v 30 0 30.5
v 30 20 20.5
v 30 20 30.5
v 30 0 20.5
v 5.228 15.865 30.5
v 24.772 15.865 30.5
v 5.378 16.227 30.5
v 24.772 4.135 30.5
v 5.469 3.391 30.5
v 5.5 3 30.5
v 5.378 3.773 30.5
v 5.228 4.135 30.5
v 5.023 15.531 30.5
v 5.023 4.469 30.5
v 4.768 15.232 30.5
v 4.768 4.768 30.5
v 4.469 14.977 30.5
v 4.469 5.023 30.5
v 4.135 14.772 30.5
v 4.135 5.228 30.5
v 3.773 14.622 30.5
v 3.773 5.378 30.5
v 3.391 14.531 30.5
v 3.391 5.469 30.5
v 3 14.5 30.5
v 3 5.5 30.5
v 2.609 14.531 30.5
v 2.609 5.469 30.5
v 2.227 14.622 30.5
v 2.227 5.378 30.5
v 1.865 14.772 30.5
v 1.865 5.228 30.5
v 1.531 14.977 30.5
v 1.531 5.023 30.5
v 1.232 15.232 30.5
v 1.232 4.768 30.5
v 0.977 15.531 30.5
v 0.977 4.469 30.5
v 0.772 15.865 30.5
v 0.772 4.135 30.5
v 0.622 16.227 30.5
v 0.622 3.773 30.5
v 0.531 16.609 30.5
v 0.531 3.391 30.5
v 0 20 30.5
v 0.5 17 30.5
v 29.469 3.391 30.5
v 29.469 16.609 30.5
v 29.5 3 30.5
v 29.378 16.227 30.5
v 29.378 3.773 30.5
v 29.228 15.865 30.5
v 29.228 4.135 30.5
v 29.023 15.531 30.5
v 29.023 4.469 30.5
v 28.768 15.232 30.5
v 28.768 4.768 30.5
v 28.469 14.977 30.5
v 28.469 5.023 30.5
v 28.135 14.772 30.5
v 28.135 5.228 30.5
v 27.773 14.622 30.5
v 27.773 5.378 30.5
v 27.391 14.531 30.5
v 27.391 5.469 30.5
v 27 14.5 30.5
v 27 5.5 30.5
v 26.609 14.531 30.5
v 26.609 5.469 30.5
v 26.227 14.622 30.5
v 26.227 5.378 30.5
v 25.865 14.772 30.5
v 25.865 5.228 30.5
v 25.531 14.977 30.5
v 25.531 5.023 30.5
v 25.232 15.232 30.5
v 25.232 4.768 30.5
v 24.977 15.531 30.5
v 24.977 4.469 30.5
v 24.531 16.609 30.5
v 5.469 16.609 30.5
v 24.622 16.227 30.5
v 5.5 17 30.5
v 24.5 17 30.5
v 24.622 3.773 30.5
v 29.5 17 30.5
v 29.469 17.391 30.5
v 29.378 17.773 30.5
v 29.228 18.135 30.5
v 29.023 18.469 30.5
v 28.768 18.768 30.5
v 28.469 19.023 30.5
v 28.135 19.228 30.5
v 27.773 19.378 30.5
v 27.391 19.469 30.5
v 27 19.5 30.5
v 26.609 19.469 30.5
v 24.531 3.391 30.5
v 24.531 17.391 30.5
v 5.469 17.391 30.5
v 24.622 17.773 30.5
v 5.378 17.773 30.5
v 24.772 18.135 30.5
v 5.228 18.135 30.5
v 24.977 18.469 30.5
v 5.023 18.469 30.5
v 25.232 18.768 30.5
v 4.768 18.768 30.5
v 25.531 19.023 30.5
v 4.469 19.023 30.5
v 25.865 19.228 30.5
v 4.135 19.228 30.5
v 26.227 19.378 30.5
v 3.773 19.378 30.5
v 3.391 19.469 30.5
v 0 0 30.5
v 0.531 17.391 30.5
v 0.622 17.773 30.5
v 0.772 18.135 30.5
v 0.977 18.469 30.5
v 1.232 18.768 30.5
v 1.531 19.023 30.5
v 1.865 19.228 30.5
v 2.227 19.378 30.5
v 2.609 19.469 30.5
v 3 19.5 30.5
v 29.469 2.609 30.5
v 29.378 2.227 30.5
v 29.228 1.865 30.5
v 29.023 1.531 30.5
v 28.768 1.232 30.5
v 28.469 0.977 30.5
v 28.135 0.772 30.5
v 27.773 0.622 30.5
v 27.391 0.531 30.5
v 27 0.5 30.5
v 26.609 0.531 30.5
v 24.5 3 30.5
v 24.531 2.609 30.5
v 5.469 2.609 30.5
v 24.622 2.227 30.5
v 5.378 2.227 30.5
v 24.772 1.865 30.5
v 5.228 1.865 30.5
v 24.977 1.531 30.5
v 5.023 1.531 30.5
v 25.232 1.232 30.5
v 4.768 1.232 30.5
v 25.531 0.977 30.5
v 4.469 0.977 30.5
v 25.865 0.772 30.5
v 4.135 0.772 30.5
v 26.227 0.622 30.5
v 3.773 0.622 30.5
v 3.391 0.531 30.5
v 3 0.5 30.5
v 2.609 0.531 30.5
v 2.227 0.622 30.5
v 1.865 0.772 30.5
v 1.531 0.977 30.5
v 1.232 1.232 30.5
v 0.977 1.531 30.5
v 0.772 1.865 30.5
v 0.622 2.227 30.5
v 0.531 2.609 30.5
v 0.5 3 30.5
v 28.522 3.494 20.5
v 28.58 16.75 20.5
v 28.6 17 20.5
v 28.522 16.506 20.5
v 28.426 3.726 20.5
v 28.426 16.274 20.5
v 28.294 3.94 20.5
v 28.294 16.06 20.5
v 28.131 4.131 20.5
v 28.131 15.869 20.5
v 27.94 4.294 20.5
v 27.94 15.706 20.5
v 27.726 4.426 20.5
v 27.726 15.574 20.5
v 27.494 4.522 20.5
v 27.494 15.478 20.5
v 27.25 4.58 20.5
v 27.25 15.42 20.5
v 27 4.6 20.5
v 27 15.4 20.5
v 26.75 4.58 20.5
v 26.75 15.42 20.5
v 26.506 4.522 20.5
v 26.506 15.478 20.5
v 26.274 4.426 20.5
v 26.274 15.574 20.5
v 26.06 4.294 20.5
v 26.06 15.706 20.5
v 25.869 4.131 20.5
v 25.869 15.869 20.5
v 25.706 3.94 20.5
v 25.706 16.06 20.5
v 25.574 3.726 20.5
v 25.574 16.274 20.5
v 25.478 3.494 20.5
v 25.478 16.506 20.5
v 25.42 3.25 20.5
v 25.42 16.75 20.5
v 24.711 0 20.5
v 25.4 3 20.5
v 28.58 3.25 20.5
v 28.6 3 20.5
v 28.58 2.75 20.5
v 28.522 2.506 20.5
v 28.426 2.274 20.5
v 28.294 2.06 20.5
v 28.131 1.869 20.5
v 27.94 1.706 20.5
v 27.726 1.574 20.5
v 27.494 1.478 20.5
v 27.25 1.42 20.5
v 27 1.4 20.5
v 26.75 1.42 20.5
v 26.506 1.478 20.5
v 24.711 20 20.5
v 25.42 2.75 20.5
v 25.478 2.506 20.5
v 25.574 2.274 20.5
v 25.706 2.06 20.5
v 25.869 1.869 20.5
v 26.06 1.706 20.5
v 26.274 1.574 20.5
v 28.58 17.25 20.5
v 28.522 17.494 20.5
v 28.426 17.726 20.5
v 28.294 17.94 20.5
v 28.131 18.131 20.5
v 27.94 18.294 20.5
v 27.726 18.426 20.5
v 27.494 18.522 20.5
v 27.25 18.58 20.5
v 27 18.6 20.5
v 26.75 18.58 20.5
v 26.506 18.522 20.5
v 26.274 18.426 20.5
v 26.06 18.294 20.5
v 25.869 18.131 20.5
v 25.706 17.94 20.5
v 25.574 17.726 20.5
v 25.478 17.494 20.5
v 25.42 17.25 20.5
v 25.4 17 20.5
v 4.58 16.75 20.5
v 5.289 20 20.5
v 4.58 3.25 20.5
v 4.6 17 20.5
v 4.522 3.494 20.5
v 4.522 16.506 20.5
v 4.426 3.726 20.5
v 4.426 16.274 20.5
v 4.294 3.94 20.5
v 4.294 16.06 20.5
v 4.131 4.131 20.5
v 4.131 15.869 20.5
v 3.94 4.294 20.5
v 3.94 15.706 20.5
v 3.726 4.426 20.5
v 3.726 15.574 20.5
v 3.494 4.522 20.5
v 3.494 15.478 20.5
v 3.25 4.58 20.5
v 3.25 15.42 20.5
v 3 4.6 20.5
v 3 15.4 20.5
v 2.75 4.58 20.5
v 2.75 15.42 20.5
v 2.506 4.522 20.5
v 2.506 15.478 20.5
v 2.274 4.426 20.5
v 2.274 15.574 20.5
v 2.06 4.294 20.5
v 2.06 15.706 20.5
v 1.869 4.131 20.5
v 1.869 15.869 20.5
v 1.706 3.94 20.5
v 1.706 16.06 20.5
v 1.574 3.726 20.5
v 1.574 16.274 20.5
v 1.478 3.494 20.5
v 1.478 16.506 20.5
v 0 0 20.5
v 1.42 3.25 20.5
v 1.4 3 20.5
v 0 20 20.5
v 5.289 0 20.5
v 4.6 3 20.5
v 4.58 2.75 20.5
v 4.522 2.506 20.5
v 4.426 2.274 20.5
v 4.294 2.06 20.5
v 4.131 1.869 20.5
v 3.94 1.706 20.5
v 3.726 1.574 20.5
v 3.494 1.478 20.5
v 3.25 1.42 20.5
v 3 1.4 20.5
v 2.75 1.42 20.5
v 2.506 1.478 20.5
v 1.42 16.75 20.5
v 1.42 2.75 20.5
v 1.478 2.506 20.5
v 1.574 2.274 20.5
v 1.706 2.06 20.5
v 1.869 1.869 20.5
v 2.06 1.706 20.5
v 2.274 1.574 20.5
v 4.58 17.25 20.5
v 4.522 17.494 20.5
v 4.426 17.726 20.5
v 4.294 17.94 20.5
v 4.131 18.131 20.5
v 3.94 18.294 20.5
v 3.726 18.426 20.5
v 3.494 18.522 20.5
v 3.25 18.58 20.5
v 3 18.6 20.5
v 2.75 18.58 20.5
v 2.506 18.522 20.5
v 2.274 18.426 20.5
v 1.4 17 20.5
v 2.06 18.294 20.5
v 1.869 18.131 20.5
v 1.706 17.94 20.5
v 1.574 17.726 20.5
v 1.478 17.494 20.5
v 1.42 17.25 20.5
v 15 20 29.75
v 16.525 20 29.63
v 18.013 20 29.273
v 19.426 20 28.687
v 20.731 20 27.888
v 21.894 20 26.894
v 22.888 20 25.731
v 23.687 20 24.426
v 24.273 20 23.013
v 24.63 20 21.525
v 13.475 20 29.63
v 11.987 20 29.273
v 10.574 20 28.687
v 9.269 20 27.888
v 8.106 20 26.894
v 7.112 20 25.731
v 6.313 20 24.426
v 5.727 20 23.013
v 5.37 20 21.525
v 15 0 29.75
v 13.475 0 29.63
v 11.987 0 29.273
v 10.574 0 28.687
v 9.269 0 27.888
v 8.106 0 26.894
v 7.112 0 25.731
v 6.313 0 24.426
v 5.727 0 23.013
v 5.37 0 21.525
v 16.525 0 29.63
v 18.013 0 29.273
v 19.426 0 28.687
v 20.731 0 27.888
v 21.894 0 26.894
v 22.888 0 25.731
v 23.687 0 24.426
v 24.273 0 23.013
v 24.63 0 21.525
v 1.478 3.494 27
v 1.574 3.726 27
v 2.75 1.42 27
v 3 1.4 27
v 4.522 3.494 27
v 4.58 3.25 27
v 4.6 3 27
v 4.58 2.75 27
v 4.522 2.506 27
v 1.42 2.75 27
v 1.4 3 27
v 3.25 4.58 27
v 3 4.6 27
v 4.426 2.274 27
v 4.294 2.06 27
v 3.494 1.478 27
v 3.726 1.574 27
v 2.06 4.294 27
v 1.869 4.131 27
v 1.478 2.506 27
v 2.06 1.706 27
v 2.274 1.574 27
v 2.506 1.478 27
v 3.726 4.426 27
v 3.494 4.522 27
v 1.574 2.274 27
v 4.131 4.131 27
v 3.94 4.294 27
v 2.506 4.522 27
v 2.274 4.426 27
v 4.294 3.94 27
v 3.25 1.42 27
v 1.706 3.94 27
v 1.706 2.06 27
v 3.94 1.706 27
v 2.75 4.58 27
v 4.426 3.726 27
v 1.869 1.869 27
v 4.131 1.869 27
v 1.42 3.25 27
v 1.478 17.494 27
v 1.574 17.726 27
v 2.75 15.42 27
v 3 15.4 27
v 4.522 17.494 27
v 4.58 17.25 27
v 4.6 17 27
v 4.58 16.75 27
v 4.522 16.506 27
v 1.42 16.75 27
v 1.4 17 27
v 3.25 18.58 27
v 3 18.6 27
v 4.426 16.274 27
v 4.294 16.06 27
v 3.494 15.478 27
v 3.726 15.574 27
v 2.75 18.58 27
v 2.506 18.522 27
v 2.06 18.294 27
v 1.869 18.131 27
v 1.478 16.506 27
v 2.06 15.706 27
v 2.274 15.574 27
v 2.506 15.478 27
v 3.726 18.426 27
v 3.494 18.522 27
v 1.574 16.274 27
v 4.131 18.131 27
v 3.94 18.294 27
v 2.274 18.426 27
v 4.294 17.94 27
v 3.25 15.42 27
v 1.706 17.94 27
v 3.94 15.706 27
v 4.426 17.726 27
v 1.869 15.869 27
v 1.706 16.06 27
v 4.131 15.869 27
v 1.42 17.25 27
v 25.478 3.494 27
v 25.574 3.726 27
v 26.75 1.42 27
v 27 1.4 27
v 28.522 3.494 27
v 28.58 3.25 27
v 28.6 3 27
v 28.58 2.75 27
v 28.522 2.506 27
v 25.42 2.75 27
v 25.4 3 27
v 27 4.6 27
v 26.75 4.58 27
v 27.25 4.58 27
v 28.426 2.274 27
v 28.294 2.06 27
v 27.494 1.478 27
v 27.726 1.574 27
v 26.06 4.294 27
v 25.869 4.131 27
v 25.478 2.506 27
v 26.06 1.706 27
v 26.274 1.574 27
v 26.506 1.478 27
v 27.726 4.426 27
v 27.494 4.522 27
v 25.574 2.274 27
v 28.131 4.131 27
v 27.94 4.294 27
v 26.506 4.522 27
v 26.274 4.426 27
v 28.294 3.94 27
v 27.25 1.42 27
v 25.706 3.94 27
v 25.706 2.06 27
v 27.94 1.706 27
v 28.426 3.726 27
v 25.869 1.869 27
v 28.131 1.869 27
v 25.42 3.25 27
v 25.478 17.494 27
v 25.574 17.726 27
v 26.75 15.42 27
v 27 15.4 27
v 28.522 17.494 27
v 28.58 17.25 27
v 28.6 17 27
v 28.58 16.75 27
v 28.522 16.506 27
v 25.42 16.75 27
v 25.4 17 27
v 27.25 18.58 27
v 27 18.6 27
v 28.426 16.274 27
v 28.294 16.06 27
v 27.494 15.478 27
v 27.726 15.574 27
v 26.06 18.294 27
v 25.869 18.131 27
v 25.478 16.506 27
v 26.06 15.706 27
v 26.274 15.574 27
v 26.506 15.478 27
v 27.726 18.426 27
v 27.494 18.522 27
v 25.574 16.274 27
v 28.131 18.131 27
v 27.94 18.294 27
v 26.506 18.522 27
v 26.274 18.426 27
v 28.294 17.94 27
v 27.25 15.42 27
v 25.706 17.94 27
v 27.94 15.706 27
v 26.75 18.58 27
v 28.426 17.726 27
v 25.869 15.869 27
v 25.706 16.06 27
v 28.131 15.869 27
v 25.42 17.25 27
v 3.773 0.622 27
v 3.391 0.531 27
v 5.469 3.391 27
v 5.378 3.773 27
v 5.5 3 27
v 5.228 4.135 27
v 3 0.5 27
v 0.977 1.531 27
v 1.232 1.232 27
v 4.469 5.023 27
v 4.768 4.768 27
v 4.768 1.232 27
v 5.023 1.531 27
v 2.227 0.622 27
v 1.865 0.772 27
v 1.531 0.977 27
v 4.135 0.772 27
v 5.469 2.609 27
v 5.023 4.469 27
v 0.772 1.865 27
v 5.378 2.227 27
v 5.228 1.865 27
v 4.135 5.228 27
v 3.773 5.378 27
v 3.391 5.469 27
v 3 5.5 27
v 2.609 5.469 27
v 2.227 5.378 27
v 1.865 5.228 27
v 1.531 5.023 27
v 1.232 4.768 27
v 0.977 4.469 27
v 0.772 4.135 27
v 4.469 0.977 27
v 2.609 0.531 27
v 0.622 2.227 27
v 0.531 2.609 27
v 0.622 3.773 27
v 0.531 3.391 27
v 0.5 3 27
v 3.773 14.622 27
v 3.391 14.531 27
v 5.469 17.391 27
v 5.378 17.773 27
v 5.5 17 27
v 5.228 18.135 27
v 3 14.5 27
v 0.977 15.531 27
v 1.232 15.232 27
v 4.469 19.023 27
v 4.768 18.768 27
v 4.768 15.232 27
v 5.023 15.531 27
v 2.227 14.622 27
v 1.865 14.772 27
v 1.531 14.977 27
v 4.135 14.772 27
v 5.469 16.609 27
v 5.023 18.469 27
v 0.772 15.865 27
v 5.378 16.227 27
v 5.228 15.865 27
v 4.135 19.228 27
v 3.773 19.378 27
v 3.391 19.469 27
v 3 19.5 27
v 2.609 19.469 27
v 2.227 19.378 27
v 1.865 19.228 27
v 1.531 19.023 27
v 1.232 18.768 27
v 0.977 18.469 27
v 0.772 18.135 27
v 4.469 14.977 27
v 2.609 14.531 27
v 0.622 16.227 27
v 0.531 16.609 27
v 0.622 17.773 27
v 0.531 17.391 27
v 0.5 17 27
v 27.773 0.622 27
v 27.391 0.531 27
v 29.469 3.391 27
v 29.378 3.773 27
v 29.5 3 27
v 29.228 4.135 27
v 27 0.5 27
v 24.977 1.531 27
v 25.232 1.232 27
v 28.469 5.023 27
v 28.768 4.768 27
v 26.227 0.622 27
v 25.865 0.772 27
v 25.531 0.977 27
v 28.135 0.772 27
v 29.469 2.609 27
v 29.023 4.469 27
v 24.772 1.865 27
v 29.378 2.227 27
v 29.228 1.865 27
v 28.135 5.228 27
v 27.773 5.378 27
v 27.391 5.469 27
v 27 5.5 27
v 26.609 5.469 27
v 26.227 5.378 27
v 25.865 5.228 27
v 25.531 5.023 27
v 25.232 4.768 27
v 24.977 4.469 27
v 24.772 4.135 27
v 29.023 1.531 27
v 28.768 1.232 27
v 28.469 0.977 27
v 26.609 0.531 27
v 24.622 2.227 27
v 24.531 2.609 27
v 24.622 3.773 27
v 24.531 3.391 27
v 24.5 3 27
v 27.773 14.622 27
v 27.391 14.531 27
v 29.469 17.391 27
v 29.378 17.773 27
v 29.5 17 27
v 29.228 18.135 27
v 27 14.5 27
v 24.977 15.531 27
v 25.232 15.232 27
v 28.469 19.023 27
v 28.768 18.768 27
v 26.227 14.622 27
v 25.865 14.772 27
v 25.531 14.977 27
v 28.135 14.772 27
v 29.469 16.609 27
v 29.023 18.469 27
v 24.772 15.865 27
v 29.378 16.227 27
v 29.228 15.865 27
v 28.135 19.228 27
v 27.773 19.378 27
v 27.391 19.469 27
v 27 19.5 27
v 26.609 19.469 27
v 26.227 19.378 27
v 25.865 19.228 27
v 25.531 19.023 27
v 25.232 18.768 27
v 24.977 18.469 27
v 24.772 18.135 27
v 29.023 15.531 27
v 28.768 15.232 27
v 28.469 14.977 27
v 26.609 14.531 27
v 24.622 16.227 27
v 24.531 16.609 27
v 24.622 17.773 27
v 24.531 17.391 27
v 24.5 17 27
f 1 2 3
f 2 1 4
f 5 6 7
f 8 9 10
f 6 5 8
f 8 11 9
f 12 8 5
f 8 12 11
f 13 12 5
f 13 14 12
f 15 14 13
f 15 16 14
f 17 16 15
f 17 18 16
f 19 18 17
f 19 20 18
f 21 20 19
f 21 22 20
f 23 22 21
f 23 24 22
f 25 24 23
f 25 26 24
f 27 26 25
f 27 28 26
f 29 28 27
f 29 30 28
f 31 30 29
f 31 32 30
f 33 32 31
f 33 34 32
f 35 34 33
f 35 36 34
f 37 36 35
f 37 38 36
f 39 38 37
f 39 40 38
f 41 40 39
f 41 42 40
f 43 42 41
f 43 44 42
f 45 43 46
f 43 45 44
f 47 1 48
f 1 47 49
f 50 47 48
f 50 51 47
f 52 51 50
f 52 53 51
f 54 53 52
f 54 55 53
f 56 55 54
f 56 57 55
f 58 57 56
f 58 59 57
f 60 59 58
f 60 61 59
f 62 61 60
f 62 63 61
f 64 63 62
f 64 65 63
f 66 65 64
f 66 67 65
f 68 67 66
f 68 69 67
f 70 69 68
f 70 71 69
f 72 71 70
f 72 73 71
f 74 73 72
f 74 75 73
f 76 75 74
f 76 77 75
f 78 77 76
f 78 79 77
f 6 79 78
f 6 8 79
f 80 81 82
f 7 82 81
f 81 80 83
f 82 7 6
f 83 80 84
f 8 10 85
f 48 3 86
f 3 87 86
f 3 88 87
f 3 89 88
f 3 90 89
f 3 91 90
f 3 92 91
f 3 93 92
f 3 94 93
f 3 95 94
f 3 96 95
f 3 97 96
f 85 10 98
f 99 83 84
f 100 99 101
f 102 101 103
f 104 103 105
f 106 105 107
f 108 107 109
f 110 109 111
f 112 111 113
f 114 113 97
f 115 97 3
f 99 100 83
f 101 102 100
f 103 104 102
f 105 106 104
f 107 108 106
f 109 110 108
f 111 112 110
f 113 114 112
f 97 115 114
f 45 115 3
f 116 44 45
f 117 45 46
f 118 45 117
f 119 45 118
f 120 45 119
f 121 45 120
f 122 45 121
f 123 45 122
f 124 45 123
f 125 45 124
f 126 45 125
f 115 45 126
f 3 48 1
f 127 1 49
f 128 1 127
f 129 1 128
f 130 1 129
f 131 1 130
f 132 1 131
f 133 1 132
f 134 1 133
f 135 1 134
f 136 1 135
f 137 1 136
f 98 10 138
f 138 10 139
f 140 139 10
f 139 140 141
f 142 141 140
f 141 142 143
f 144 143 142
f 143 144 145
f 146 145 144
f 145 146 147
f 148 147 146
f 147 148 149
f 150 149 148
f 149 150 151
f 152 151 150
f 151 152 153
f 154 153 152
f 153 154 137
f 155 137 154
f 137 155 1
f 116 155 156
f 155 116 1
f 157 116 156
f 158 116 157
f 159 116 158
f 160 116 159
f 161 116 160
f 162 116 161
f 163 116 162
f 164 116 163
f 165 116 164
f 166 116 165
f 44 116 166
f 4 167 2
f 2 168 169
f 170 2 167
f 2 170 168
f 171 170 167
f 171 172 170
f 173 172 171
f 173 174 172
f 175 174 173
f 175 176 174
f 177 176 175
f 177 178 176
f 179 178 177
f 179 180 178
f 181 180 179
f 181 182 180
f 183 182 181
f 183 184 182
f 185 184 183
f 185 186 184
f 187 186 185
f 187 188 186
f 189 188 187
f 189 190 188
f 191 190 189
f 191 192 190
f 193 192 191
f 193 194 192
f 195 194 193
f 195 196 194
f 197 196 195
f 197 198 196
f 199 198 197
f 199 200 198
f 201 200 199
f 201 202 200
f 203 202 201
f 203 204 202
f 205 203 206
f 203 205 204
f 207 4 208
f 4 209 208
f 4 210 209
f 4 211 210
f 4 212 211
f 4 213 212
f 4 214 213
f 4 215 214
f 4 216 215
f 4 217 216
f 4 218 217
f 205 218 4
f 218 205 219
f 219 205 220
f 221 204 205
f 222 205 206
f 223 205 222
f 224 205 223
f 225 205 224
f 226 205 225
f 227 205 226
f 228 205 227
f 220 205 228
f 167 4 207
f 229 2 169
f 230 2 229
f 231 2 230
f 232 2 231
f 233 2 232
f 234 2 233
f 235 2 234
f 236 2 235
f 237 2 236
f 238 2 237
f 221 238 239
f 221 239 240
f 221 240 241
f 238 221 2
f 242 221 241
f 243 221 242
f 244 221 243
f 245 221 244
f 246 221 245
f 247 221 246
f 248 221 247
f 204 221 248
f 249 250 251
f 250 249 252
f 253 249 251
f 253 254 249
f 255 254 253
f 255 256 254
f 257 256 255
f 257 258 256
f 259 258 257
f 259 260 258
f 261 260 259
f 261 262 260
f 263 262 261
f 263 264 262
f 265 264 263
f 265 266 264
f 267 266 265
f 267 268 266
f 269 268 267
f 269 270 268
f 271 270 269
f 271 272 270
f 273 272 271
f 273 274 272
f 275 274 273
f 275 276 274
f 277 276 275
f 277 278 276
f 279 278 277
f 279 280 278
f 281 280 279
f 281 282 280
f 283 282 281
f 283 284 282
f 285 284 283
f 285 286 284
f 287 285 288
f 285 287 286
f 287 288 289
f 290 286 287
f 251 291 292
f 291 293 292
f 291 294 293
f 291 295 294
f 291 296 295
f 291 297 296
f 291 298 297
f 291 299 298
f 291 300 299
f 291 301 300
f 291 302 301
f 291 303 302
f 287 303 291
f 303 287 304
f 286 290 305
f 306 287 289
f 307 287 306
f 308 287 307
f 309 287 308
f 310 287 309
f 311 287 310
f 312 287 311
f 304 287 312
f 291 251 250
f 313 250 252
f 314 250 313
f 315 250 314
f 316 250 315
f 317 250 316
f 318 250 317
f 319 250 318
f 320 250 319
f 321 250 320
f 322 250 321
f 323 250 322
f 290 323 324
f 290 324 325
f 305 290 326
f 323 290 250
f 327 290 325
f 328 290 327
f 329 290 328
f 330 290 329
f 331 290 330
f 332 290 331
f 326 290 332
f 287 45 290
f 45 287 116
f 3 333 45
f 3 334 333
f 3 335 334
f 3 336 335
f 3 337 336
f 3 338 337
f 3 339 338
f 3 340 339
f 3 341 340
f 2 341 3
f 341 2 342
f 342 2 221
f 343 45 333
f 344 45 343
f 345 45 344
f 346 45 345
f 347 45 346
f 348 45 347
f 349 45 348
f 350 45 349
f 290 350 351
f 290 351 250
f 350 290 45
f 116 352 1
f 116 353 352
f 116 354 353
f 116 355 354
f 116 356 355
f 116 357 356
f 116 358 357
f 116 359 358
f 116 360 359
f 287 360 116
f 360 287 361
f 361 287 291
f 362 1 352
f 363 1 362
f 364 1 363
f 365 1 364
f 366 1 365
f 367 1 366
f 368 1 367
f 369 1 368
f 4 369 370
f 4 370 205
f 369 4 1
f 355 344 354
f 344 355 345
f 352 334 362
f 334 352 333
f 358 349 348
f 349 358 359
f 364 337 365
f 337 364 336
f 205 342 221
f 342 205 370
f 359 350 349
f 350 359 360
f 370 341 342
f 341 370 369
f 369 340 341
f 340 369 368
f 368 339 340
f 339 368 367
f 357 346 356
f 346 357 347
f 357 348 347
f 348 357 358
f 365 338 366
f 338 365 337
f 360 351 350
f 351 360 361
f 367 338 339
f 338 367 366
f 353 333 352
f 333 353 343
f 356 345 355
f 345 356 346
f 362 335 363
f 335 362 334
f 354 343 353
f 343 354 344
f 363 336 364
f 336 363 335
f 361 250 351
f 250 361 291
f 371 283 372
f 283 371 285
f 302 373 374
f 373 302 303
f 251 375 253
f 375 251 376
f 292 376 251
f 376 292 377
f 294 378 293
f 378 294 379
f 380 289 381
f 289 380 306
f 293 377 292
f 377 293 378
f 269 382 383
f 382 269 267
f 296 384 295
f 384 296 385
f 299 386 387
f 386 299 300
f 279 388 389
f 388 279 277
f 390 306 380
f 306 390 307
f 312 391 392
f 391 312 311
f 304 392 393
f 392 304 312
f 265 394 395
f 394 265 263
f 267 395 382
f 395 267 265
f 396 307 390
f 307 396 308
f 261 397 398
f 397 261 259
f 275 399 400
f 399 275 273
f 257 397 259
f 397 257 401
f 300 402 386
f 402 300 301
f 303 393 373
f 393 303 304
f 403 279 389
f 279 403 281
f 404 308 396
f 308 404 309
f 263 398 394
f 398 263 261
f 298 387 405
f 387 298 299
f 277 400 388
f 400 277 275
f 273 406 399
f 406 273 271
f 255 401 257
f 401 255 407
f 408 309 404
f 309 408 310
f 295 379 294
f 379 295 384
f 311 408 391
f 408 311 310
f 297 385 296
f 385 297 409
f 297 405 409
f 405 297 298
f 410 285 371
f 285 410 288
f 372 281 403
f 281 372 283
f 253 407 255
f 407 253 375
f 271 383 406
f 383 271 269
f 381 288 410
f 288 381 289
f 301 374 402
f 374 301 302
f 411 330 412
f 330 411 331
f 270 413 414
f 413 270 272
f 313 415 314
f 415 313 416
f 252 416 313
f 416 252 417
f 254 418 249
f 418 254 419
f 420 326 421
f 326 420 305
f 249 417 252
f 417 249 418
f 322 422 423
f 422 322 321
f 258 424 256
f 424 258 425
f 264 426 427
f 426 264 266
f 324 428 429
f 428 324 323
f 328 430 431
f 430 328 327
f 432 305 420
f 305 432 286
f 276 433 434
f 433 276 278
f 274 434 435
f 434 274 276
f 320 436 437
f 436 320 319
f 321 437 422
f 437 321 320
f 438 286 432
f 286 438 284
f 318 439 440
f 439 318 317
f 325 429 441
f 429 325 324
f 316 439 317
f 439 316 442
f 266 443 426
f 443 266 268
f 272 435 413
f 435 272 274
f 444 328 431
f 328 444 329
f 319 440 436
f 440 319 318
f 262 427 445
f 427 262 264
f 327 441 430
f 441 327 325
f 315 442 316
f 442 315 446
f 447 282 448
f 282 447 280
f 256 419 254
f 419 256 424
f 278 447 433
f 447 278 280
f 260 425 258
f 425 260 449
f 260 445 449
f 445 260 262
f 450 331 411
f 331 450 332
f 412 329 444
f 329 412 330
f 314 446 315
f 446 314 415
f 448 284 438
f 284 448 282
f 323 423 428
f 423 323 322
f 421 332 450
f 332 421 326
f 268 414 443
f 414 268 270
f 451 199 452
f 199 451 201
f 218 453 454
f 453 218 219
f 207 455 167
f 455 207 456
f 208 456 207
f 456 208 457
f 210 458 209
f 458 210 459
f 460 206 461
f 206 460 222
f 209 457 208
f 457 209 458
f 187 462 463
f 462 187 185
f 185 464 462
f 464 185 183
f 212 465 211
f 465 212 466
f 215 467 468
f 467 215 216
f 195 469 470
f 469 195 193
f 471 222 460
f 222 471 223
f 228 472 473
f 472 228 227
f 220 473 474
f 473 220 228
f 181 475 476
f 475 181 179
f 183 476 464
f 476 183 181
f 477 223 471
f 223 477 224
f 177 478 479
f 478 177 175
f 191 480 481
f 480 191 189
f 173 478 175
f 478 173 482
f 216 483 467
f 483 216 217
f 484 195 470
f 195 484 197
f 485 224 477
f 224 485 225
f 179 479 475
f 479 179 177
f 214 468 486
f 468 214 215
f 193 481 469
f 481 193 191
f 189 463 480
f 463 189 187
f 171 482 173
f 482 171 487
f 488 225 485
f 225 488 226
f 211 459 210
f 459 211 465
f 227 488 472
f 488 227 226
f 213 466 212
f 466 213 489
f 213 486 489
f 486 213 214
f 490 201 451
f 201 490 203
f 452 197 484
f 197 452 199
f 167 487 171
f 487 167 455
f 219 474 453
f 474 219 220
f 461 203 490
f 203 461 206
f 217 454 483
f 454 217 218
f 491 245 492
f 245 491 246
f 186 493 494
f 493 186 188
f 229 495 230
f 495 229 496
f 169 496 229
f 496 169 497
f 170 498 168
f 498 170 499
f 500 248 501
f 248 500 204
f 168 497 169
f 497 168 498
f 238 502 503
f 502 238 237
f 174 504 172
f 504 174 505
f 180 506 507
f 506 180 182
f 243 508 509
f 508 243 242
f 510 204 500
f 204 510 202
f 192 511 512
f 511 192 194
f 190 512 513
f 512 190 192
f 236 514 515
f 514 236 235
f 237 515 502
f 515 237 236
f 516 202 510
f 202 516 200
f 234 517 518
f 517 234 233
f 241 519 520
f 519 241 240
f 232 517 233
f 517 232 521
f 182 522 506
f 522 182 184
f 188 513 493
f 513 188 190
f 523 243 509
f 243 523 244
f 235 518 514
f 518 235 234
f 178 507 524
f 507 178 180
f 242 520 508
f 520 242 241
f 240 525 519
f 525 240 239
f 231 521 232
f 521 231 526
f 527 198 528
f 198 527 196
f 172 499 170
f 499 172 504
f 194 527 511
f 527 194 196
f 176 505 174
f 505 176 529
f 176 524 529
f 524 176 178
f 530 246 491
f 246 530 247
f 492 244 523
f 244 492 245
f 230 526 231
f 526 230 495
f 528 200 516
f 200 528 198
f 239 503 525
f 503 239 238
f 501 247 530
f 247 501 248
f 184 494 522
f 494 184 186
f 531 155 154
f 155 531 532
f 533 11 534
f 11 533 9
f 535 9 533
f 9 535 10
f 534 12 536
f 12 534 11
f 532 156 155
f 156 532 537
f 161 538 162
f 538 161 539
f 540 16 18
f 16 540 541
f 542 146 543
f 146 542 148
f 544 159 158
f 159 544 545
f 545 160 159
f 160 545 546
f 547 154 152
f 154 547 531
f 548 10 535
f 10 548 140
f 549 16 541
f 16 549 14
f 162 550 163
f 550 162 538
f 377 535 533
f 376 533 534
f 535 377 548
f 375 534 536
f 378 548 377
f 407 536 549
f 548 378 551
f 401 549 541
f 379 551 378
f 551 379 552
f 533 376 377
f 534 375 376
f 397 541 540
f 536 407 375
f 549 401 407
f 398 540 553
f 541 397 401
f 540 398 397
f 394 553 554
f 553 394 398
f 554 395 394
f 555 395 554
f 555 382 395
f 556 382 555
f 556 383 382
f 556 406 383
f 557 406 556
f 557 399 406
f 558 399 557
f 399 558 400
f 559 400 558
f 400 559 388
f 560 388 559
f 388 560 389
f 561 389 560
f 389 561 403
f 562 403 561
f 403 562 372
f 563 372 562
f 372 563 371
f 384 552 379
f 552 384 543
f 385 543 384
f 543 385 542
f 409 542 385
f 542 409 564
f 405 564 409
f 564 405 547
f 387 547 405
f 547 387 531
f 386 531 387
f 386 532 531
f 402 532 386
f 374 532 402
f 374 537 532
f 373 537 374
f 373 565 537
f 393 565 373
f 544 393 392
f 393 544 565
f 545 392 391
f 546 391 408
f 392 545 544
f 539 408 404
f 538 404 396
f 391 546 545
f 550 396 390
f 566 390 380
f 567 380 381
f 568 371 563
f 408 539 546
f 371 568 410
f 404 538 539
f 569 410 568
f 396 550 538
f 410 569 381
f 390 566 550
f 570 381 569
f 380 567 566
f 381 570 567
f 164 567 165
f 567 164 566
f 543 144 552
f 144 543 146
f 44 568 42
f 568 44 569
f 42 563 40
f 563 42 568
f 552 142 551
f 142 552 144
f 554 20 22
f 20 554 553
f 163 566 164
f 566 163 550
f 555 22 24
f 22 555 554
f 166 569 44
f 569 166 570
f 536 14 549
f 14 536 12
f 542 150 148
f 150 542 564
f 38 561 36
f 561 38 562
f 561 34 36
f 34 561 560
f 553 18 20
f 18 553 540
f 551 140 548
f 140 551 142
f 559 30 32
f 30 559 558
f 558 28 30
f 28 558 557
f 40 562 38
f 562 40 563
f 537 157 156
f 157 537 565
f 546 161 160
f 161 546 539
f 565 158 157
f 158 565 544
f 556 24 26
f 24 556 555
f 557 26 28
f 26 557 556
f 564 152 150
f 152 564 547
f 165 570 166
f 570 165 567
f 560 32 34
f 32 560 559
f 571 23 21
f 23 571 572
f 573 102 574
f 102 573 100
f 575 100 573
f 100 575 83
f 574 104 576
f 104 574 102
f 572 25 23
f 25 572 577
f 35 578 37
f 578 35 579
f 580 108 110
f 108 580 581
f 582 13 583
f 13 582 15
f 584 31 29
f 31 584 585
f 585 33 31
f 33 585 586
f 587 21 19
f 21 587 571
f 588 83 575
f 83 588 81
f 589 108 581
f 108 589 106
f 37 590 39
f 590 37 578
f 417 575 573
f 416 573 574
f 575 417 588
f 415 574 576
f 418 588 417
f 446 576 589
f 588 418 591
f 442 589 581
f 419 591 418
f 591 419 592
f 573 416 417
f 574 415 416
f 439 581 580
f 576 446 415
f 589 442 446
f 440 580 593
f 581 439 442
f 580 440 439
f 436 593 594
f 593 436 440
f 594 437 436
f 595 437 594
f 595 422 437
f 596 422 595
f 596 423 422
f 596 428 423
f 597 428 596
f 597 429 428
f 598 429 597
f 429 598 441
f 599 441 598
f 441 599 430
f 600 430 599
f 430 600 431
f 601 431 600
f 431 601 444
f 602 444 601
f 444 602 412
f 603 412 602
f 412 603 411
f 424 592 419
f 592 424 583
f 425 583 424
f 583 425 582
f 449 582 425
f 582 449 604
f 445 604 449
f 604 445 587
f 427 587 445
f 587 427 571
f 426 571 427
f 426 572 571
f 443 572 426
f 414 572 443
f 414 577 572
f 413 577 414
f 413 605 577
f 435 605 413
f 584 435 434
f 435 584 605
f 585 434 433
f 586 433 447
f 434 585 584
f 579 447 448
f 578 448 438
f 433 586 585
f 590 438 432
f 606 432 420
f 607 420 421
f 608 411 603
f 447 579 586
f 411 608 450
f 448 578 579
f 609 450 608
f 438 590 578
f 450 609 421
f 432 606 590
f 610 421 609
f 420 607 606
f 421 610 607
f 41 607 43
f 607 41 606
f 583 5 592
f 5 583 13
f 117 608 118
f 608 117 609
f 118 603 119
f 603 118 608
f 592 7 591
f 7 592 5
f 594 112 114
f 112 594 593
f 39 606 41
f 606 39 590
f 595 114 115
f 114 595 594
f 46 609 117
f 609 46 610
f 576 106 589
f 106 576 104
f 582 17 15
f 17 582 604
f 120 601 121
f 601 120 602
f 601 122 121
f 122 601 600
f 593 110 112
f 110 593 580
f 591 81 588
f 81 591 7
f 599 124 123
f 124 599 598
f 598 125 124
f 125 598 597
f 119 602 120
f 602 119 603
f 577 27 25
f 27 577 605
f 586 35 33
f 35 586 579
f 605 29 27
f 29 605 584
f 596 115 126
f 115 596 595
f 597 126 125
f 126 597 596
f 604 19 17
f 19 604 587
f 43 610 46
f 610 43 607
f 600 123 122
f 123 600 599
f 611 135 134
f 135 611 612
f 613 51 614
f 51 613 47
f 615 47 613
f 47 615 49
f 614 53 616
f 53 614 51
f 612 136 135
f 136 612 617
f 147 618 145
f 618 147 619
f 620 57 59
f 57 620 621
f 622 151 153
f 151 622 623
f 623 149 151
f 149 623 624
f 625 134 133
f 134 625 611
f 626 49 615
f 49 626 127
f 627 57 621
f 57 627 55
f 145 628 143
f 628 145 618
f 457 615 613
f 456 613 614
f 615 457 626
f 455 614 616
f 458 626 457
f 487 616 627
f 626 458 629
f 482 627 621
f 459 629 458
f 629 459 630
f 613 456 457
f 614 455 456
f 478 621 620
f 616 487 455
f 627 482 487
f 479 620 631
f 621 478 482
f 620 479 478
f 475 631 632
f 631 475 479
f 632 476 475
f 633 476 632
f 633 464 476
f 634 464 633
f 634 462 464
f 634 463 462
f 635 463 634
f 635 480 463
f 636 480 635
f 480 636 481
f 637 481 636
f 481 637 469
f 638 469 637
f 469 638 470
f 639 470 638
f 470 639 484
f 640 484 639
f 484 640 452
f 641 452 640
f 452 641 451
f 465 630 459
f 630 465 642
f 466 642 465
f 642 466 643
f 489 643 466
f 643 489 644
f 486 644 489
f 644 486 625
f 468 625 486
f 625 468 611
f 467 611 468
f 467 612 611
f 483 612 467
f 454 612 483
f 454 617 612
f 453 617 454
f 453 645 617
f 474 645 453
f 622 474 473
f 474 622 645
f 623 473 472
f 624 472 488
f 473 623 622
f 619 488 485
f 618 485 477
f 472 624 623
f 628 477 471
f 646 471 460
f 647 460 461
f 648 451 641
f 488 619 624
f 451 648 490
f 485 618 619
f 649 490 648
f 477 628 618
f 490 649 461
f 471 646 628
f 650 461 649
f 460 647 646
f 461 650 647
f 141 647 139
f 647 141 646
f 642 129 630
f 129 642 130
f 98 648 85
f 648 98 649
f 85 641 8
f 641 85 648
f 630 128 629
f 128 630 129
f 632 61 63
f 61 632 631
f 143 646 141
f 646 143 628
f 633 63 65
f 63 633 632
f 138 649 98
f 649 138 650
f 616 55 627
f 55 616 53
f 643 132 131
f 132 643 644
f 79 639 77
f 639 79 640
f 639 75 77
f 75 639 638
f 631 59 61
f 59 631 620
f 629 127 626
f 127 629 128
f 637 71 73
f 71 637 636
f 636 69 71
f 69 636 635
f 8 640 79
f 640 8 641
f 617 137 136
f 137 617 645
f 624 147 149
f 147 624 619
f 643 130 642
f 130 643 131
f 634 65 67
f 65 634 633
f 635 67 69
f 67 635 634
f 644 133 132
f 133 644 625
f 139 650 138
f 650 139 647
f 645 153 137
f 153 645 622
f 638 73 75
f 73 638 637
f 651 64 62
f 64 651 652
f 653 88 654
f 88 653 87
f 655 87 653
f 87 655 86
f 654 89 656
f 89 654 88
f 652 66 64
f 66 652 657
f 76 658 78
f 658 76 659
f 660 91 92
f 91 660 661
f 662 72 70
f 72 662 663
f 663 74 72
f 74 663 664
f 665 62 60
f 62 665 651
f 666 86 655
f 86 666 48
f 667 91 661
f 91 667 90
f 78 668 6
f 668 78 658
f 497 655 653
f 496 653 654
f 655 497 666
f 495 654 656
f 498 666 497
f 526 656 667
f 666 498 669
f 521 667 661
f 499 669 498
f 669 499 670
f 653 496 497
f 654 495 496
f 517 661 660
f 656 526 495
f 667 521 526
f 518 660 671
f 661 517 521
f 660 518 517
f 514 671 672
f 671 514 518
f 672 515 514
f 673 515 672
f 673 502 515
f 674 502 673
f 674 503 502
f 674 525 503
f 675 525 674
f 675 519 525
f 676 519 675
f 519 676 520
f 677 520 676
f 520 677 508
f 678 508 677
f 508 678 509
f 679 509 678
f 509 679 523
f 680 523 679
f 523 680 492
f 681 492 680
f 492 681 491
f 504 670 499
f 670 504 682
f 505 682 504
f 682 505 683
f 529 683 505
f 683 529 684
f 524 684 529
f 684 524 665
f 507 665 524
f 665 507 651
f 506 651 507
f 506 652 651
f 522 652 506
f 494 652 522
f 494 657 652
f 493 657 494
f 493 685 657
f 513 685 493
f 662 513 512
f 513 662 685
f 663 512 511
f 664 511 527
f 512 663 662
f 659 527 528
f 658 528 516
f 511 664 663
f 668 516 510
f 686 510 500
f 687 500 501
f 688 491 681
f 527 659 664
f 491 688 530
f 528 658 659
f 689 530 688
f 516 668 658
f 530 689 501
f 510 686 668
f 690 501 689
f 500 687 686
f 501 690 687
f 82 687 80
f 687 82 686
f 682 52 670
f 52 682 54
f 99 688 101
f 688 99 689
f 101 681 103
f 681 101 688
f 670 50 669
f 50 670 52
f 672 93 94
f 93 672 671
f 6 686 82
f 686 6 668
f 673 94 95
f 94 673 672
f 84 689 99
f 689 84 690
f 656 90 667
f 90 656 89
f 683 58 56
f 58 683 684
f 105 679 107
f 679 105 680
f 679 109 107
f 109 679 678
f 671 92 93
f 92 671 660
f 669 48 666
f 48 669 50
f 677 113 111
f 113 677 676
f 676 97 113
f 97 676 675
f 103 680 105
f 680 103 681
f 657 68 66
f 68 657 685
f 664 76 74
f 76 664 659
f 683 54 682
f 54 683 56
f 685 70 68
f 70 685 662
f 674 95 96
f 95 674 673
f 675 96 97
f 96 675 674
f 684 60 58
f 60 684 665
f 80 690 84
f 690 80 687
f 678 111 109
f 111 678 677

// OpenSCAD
$fn = 40;


//bottom();
top();
module top(){
difference(){
translate([0,0,20.5])cube([30,20,10]);
translate([15,-0.01,20])rotate([-90,0,0])cylinder(d=19.5,h=30);
    translate([3,3,20])cylinder(d=3.2,h=20);
    translate([3,20-3,20])cylinder(d=3.2,h=20);
    translate([30-3,3,20])cylinder(d=3.2,h=20);
    translate([30-3,20-3,20])cylinder(d=3.2,h=20);

    translate([3,3,27])cylinder(d=5,h=20);
    translate([3,20-3,27])cylinder(d=5,h=20);
    translate([30-3,3,27])cylinder(d=5,h=20);
    translate([30-3,20-3,27])cylinder(d=5,h=20);
}}
module bottom(){difference(){
    cube([30,20,19.5]);
    translate([15,-0.01,20])rotate([-90,0,0])cylinder(d=19.5,h=30);
    
    translate([15,5,0])cylinder(d=4,h=30);
    translate([15,5,6])cylinder(d=8,h=30);
    
    translate([15,15,0])cylinder(d=4,h=30);
    translate([15,15,6])cylinder(d=8,h=30);
    
    translate([3,3,10])cylinder(d=2.6,h=20);
    translate([3,20-3,10])cylinder(d=2.6,h=20);
    
        translate([30-3,3,10])cylinder(d=2.6,h=20);
    translate([30-3,20-3,10])cylinder(d=2.6,h=20);
}}
